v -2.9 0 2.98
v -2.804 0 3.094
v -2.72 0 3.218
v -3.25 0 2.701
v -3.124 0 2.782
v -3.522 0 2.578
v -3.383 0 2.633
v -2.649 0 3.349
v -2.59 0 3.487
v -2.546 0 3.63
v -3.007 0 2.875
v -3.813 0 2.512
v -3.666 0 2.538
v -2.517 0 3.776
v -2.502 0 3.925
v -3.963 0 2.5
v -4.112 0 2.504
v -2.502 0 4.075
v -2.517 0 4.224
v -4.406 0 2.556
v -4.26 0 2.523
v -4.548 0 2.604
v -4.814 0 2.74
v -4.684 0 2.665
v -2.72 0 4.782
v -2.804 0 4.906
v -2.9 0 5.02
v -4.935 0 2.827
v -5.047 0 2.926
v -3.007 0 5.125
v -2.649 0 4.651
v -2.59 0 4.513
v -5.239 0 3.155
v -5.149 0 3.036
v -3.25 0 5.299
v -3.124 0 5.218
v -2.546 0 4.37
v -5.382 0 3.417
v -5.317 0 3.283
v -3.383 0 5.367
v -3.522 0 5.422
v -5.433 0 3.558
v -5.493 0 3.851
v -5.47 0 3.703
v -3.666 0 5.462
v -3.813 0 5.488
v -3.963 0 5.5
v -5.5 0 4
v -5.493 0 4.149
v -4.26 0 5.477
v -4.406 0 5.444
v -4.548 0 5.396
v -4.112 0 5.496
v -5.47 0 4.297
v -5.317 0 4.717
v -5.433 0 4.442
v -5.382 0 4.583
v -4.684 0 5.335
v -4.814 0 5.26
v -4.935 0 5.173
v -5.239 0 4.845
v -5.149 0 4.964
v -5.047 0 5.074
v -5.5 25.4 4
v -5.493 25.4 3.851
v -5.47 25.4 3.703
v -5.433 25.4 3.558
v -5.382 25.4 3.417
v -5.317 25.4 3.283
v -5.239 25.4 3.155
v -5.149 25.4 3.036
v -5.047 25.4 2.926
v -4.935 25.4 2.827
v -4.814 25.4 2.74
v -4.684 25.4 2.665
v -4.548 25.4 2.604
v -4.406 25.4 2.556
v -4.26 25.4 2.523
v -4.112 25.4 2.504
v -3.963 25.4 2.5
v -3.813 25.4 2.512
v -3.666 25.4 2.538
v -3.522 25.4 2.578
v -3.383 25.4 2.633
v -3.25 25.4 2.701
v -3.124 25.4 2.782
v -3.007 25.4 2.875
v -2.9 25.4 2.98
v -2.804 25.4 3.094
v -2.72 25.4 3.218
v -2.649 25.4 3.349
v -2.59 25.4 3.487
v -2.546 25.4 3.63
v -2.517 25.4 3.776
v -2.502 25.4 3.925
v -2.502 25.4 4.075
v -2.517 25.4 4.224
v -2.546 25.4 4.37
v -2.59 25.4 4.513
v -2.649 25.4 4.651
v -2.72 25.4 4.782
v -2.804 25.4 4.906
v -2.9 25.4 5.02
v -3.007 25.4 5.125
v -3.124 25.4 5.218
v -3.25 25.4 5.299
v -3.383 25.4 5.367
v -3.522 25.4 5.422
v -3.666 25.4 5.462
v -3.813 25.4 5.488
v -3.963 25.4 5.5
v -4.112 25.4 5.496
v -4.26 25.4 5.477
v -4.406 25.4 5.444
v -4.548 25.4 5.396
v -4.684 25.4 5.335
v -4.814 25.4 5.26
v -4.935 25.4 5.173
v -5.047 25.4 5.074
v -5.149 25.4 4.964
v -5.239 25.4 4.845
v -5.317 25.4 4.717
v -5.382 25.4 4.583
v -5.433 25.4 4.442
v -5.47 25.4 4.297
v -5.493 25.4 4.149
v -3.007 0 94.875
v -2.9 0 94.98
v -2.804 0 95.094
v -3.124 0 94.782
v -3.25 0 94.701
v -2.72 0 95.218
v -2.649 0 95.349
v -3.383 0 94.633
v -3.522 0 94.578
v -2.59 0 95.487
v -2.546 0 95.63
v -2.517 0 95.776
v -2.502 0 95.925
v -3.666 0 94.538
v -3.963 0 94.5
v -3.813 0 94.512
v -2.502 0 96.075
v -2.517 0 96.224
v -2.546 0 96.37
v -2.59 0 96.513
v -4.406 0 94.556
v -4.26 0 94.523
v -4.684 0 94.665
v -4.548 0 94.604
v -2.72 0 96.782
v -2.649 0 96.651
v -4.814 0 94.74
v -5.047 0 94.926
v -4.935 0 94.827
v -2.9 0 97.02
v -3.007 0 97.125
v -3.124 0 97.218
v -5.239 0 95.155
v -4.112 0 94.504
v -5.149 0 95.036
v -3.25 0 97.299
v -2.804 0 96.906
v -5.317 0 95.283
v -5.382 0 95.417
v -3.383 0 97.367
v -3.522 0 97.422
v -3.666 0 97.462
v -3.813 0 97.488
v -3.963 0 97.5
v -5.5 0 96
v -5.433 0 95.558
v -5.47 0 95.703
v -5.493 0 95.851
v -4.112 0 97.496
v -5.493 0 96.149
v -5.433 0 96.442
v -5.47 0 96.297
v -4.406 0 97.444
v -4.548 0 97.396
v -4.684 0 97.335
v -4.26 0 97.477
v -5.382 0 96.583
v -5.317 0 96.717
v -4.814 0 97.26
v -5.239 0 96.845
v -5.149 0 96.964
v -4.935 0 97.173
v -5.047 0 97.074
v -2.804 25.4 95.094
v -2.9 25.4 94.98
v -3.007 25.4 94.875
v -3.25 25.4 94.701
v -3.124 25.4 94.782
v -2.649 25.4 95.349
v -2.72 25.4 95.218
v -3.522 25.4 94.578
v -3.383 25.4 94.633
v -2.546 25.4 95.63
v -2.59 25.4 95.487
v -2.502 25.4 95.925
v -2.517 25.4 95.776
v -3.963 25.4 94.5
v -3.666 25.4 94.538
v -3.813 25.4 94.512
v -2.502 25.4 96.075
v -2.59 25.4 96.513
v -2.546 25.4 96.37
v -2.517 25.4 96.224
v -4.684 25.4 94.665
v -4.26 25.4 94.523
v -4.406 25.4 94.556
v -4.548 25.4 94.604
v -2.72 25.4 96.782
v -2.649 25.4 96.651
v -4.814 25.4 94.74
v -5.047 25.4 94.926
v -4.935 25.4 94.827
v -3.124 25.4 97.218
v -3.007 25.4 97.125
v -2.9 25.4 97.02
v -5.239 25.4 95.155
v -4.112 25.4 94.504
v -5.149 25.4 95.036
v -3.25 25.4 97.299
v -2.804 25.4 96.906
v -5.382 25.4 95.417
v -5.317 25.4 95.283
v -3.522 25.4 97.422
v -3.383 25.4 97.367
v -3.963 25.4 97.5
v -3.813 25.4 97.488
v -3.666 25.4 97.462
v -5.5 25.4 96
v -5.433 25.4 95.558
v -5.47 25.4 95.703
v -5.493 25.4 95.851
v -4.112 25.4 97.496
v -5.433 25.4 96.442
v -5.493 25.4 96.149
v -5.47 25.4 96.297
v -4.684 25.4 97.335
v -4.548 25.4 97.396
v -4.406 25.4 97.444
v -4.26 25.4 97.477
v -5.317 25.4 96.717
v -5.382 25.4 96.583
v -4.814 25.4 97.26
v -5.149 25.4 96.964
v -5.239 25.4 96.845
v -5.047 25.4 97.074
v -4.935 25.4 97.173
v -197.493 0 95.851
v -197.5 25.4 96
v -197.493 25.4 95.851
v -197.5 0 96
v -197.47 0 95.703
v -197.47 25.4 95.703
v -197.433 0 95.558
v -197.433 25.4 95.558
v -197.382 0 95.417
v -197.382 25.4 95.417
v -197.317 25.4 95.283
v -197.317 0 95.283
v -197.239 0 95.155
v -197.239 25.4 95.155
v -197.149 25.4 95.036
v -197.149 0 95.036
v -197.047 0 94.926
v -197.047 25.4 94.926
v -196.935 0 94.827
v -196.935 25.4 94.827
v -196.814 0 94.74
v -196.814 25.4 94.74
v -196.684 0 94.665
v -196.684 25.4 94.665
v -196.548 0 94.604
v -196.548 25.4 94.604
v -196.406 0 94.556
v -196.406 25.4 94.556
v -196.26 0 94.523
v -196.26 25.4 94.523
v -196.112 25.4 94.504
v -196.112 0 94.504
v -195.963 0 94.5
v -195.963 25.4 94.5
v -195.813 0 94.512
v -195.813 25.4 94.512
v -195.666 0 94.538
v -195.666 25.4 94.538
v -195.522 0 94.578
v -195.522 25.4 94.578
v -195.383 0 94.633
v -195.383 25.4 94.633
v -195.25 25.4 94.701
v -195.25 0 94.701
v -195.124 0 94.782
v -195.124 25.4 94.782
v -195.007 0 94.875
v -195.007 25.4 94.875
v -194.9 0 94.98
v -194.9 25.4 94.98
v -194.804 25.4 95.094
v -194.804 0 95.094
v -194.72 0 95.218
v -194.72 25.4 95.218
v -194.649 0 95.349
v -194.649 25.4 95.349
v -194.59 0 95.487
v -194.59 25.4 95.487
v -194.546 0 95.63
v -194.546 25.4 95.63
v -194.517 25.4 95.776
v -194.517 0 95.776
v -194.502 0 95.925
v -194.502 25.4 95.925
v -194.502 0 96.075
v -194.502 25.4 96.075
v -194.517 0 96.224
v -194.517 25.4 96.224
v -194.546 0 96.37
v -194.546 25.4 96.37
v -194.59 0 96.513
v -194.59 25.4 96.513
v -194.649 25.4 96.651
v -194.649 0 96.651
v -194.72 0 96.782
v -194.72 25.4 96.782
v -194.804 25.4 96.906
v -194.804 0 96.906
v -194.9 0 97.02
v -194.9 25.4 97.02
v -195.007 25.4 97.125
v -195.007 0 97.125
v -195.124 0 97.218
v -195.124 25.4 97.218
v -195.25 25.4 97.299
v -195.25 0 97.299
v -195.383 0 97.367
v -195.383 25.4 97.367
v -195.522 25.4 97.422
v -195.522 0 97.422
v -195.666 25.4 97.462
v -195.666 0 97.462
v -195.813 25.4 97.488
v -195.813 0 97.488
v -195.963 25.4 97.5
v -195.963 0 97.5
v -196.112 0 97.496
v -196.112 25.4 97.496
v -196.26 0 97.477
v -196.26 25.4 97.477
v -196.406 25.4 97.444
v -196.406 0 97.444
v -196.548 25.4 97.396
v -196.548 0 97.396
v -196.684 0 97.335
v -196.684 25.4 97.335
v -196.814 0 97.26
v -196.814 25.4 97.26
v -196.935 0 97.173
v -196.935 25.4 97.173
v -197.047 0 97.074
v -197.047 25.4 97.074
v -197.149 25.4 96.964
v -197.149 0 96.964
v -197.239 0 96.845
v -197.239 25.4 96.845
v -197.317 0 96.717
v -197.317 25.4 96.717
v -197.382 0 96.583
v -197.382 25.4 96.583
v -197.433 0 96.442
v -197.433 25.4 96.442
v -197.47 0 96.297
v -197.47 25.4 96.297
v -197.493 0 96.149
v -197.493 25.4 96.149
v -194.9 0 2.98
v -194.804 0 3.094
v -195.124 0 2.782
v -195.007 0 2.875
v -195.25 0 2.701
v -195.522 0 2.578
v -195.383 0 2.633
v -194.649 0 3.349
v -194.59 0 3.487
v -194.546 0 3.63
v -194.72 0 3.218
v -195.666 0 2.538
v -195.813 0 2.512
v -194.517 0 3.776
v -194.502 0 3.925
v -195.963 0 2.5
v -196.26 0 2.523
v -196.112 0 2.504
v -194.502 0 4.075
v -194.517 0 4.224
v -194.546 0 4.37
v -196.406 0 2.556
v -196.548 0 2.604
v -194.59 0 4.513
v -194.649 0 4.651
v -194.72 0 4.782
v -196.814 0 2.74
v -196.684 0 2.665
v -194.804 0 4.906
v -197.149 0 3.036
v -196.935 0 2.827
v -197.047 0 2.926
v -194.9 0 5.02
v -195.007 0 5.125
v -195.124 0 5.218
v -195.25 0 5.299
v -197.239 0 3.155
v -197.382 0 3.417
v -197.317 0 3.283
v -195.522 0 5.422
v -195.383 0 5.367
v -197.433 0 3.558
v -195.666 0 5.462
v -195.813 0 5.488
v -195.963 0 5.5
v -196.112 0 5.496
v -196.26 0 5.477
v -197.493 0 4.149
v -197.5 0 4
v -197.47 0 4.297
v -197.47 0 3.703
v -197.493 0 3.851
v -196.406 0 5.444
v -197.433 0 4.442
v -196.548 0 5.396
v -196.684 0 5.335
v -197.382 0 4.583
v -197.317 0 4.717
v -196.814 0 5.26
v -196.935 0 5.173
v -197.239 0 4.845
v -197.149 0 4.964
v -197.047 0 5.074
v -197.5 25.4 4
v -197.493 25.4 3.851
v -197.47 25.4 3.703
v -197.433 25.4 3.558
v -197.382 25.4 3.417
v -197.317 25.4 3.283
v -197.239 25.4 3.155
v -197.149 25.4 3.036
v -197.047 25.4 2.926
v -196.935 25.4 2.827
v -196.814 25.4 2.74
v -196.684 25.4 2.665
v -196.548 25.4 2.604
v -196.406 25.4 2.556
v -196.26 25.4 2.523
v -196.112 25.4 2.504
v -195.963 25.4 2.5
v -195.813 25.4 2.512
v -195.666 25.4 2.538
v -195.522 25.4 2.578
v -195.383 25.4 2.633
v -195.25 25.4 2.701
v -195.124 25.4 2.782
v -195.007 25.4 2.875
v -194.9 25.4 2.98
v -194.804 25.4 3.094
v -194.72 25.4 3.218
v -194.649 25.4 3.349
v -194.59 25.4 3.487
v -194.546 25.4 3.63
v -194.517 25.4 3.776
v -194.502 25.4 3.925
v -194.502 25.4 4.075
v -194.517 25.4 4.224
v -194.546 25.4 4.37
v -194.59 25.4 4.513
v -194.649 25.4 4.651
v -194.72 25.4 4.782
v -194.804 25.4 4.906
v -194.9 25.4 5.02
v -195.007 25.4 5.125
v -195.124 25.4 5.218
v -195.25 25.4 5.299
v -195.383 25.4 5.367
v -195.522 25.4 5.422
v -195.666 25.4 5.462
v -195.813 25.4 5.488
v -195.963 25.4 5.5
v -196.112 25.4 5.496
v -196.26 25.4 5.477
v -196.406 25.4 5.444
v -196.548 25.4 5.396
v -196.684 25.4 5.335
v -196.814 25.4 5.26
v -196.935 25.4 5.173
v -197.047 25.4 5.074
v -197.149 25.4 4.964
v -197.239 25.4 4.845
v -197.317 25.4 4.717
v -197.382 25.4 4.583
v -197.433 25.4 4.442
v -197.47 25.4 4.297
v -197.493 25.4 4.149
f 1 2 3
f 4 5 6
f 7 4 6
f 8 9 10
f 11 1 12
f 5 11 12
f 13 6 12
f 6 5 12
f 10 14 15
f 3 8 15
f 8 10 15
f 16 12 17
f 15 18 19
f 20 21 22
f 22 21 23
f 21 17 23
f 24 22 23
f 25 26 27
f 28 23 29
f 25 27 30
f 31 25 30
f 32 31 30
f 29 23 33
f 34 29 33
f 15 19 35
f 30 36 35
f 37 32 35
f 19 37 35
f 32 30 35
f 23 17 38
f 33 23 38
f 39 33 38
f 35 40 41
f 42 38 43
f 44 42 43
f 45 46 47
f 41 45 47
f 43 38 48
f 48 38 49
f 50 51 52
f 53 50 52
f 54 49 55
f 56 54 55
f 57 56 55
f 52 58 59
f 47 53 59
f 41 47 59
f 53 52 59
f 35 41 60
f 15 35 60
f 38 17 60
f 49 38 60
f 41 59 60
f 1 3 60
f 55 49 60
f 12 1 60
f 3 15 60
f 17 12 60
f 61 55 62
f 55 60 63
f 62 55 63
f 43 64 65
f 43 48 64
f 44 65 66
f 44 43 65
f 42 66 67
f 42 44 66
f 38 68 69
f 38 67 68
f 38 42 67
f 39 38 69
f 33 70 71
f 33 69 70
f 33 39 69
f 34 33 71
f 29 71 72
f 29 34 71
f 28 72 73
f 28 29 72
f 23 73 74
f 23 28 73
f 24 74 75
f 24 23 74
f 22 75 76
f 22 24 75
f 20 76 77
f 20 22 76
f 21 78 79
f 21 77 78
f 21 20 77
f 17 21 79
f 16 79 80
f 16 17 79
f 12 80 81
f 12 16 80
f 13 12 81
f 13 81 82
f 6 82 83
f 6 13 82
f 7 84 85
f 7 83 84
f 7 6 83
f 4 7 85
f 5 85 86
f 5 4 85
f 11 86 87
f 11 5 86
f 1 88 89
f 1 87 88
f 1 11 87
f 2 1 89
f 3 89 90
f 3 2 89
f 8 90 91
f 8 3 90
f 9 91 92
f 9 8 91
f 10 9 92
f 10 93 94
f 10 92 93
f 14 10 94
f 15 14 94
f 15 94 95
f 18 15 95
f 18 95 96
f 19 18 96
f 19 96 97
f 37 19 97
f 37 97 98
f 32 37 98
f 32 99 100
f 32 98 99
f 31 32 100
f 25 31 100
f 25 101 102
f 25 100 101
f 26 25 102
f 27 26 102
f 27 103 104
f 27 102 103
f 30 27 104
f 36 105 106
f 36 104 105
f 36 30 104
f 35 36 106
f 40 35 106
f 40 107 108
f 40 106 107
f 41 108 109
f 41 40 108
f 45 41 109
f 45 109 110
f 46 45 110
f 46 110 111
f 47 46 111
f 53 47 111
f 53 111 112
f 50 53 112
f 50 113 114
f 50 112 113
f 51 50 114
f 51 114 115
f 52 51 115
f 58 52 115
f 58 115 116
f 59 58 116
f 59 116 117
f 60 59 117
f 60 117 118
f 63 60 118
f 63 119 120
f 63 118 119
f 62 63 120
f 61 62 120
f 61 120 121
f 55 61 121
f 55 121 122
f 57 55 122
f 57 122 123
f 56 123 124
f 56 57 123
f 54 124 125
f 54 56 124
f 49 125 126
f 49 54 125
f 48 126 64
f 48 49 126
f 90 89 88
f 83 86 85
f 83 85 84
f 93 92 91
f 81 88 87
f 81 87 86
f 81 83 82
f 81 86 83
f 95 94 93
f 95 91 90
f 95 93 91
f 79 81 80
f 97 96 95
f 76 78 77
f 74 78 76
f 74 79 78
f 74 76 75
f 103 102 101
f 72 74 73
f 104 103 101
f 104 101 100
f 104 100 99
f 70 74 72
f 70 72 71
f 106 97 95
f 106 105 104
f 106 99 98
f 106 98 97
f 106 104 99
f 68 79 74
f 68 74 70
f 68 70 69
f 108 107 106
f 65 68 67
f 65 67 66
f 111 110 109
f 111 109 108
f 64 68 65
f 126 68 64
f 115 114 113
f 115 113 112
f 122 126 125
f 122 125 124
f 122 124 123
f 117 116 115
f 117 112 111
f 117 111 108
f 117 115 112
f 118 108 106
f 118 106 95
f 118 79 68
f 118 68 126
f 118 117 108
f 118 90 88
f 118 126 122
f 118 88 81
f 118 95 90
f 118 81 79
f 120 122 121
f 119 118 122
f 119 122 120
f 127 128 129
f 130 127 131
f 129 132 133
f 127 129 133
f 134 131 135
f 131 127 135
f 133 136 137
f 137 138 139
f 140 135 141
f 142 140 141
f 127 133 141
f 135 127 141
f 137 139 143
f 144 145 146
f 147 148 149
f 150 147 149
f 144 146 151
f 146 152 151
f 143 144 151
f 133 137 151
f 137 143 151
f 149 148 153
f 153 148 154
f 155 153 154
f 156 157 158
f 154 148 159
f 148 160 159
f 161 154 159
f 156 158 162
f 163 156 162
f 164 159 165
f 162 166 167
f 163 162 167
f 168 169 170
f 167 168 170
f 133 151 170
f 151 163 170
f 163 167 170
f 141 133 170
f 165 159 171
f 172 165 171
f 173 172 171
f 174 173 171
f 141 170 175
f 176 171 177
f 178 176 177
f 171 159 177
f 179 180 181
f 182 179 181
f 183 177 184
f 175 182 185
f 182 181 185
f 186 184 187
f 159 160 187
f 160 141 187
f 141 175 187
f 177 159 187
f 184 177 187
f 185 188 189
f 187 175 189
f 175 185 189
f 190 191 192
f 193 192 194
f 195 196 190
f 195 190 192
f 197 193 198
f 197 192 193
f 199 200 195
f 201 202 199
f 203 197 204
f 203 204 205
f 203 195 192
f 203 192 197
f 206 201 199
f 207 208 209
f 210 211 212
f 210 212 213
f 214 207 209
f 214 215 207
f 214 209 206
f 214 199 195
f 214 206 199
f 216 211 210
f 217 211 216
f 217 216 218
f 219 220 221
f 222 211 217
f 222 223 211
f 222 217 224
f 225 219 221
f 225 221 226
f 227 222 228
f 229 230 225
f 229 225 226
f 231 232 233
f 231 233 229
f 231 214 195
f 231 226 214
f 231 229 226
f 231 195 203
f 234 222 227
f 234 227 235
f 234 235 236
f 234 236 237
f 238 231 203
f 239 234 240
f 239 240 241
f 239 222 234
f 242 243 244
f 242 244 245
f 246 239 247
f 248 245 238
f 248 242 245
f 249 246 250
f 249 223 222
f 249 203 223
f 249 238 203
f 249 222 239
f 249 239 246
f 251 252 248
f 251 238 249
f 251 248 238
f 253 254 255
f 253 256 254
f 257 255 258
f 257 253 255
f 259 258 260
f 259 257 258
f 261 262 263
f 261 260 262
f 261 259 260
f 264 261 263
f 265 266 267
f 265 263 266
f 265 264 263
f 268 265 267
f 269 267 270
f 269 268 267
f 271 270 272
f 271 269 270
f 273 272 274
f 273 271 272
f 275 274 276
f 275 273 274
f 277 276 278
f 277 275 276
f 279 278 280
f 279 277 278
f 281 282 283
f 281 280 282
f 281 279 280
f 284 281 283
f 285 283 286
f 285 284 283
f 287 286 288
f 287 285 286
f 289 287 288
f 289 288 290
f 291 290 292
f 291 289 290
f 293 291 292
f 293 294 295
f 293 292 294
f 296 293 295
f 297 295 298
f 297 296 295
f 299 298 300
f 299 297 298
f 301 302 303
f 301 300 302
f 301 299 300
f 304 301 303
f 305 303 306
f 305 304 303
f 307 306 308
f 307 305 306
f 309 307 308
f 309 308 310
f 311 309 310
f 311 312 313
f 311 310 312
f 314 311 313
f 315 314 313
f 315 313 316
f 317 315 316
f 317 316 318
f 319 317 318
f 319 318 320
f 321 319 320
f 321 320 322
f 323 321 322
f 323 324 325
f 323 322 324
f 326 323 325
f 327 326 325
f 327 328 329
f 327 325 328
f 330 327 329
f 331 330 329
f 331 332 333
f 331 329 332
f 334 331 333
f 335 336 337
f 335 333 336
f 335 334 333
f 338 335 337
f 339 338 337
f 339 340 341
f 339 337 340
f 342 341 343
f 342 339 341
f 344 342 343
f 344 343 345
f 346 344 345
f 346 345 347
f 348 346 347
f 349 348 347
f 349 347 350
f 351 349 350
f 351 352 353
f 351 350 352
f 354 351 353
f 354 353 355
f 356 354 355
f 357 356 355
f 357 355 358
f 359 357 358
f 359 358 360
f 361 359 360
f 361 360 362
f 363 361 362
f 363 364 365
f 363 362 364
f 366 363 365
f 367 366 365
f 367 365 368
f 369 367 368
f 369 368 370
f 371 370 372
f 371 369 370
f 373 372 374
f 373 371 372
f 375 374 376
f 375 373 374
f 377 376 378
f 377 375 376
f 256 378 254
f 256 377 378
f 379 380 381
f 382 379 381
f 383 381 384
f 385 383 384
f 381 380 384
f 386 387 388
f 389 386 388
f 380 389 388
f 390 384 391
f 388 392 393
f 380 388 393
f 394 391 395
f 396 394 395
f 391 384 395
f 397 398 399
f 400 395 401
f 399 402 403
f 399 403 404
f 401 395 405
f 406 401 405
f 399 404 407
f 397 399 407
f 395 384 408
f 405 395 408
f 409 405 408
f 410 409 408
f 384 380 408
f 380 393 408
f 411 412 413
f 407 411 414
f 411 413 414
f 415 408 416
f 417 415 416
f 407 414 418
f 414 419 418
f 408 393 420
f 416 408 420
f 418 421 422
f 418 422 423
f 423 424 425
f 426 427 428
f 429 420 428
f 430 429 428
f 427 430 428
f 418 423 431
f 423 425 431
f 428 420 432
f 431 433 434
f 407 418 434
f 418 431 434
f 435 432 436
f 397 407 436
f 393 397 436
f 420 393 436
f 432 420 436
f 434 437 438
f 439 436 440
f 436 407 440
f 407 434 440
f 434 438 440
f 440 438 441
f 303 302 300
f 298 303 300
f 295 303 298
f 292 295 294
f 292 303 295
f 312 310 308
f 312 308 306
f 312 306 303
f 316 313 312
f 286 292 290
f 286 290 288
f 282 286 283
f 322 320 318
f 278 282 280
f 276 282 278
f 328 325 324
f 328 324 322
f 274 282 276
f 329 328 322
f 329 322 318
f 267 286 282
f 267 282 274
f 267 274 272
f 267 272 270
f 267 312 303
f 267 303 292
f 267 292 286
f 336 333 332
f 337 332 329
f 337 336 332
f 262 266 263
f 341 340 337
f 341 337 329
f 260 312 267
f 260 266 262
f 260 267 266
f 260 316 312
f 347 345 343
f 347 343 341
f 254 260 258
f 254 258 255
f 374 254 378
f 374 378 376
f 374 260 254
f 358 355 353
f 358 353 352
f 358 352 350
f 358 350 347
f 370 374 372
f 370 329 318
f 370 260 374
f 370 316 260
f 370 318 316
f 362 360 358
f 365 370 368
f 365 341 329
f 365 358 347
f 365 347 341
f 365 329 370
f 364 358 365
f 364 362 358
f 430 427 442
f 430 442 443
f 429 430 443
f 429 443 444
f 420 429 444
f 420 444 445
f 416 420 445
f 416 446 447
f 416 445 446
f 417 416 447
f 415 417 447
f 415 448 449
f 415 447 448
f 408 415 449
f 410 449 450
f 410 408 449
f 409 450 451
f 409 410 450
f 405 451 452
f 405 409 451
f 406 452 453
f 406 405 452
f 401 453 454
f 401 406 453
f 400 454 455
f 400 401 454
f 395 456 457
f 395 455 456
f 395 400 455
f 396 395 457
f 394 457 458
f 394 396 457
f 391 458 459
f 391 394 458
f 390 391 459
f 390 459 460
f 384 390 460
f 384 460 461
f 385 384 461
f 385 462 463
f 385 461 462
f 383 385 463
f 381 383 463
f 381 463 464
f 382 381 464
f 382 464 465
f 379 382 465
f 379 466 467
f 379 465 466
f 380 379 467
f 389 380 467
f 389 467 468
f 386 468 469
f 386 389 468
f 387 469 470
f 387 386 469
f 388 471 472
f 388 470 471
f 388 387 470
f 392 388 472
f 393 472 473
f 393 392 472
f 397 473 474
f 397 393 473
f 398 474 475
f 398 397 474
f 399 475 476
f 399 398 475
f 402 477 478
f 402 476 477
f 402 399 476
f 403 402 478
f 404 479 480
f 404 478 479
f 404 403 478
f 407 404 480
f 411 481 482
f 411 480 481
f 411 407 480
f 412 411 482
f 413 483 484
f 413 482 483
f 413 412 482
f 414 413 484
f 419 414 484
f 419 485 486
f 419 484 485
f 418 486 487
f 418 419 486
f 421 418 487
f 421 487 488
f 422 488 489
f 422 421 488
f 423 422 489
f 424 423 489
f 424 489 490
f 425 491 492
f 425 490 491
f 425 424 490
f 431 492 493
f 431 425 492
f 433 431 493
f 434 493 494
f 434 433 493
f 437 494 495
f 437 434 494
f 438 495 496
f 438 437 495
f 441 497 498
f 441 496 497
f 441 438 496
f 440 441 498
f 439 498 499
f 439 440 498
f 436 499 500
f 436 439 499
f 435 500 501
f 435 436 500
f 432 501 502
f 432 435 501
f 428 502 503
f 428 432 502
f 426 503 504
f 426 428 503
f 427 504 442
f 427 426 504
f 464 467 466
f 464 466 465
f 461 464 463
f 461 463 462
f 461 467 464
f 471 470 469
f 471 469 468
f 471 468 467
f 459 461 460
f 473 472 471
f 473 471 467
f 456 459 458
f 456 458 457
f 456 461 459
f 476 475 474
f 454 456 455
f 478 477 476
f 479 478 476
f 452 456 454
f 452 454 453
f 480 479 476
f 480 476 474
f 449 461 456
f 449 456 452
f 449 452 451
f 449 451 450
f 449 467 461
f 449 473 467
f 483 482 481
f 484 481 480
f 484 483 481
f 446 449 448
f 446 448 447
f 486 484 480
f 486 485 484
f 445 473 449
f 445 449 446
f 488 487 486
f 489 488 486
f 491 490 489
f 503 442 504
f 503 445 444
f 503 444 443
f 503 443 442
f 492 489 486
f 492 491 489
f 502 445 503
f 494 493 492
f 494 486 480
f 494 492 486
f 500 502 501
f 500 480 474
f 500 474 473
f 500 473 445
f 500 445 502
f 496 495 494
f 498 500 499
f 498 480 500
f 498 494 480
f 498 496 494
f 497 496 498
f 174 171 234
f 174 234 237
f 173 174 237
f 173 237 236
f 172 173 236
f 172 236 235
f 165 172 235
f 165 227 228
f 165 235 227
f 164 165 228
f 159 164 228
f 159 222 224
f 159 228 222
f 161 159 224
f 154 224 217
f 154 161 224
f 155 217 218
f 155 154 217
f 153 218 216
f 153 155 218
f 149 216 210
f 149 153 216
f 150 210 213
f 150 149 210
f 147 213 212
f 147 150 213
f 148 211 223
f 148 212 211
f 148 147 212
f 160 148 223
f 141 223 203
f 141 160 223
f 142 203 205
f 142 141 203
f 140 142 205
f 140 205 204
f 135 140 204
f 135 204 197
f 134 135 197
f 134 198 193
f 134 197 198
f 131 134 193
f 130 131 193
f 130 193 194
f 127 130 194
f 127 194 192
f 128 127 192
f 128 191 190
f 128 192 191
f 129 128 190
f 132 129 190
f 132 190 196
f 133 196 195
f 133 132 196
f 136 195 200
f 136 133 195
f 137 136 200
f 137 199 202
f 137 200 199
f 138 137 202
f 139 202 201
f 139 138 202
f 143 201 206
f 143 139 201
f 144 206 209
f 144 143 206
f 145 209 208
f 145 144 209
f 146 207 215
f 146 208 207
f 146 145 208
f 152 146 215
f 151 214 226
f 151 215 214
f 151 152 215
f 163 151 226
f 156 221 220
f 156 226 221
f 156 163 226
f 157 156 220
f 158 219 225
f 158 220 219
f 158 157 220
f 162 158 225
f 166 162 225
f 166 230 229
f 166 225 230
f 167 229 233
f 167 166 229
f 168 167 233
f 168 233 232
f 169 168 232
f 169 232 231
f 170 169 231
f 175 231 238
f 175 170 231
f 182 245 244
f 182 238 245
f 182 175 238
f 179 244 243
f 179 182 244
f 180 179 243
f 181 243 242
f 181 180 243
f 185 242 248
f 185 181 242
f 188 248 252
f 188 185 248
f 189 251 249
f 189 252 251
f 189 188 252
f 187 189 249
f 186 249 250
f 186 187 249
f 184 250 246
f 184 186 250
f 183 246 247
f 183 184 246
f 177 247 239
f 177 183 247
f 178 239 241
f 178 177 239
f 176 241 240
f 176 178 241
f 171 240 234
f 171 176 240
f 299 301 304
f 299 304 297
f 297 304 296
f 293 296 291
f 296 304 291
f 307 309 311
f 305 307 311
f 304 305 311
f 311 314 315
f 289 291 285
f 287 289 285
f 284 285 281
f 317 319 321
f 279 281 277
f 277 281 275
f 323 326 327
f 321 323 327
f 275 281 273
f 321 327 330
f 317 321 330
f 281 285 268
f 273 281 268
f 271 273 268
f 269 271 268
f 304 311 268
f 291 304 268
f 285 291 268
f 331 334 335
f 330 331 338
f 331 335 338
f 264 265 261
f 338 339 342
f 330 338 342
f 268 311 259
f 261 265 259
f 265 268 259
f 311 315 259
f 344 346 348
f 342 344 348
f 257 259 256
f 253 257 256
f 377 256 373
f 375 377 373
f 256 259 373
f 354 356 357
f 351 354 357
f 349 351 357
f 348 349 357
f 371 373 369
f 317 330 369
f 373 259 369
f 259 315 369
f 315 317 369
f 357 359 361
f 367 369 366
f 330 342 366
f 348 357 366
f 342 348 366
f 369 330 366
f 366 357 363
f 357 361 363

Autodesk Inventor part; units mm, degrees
ref_plane "YZ Plane" through (0, 0, 0) normal (1, 0, 0) x (0, 1, 0)
ref_plane "XZ Plane" through (0, 0, 0) normal (0, 1, 0) x (-1, 0, 0)
ref_plane "XY Plane" through (0, 0, 0) normal (0, 0, 1) x (1, 0, 0)
sketch "Sketch1" plane through (0, 0, 0) normal (0, 1, 0) x (-1, 0, 0)
  line L0 (0, 0) -> (200, 0)
  line L1 (200, 0) -> (200, 100)
  line L2 (200, 100) -> (0, 100)
  line L3 (0, 100) -> (0, 0)
  circle A0 centre (4, 4) radius 1.5
  circle A1 centre (196, 96) radius 1.5
  circle A2 centre (4, 96) radius 1.5
  circle A3 centre (196, 4) radius 1.5
extrude "Extrusion1" add sketch "Sketch1" along normal blind 25.4 contours A0 | A1 | A2 | A3
properties part number "RAM"
